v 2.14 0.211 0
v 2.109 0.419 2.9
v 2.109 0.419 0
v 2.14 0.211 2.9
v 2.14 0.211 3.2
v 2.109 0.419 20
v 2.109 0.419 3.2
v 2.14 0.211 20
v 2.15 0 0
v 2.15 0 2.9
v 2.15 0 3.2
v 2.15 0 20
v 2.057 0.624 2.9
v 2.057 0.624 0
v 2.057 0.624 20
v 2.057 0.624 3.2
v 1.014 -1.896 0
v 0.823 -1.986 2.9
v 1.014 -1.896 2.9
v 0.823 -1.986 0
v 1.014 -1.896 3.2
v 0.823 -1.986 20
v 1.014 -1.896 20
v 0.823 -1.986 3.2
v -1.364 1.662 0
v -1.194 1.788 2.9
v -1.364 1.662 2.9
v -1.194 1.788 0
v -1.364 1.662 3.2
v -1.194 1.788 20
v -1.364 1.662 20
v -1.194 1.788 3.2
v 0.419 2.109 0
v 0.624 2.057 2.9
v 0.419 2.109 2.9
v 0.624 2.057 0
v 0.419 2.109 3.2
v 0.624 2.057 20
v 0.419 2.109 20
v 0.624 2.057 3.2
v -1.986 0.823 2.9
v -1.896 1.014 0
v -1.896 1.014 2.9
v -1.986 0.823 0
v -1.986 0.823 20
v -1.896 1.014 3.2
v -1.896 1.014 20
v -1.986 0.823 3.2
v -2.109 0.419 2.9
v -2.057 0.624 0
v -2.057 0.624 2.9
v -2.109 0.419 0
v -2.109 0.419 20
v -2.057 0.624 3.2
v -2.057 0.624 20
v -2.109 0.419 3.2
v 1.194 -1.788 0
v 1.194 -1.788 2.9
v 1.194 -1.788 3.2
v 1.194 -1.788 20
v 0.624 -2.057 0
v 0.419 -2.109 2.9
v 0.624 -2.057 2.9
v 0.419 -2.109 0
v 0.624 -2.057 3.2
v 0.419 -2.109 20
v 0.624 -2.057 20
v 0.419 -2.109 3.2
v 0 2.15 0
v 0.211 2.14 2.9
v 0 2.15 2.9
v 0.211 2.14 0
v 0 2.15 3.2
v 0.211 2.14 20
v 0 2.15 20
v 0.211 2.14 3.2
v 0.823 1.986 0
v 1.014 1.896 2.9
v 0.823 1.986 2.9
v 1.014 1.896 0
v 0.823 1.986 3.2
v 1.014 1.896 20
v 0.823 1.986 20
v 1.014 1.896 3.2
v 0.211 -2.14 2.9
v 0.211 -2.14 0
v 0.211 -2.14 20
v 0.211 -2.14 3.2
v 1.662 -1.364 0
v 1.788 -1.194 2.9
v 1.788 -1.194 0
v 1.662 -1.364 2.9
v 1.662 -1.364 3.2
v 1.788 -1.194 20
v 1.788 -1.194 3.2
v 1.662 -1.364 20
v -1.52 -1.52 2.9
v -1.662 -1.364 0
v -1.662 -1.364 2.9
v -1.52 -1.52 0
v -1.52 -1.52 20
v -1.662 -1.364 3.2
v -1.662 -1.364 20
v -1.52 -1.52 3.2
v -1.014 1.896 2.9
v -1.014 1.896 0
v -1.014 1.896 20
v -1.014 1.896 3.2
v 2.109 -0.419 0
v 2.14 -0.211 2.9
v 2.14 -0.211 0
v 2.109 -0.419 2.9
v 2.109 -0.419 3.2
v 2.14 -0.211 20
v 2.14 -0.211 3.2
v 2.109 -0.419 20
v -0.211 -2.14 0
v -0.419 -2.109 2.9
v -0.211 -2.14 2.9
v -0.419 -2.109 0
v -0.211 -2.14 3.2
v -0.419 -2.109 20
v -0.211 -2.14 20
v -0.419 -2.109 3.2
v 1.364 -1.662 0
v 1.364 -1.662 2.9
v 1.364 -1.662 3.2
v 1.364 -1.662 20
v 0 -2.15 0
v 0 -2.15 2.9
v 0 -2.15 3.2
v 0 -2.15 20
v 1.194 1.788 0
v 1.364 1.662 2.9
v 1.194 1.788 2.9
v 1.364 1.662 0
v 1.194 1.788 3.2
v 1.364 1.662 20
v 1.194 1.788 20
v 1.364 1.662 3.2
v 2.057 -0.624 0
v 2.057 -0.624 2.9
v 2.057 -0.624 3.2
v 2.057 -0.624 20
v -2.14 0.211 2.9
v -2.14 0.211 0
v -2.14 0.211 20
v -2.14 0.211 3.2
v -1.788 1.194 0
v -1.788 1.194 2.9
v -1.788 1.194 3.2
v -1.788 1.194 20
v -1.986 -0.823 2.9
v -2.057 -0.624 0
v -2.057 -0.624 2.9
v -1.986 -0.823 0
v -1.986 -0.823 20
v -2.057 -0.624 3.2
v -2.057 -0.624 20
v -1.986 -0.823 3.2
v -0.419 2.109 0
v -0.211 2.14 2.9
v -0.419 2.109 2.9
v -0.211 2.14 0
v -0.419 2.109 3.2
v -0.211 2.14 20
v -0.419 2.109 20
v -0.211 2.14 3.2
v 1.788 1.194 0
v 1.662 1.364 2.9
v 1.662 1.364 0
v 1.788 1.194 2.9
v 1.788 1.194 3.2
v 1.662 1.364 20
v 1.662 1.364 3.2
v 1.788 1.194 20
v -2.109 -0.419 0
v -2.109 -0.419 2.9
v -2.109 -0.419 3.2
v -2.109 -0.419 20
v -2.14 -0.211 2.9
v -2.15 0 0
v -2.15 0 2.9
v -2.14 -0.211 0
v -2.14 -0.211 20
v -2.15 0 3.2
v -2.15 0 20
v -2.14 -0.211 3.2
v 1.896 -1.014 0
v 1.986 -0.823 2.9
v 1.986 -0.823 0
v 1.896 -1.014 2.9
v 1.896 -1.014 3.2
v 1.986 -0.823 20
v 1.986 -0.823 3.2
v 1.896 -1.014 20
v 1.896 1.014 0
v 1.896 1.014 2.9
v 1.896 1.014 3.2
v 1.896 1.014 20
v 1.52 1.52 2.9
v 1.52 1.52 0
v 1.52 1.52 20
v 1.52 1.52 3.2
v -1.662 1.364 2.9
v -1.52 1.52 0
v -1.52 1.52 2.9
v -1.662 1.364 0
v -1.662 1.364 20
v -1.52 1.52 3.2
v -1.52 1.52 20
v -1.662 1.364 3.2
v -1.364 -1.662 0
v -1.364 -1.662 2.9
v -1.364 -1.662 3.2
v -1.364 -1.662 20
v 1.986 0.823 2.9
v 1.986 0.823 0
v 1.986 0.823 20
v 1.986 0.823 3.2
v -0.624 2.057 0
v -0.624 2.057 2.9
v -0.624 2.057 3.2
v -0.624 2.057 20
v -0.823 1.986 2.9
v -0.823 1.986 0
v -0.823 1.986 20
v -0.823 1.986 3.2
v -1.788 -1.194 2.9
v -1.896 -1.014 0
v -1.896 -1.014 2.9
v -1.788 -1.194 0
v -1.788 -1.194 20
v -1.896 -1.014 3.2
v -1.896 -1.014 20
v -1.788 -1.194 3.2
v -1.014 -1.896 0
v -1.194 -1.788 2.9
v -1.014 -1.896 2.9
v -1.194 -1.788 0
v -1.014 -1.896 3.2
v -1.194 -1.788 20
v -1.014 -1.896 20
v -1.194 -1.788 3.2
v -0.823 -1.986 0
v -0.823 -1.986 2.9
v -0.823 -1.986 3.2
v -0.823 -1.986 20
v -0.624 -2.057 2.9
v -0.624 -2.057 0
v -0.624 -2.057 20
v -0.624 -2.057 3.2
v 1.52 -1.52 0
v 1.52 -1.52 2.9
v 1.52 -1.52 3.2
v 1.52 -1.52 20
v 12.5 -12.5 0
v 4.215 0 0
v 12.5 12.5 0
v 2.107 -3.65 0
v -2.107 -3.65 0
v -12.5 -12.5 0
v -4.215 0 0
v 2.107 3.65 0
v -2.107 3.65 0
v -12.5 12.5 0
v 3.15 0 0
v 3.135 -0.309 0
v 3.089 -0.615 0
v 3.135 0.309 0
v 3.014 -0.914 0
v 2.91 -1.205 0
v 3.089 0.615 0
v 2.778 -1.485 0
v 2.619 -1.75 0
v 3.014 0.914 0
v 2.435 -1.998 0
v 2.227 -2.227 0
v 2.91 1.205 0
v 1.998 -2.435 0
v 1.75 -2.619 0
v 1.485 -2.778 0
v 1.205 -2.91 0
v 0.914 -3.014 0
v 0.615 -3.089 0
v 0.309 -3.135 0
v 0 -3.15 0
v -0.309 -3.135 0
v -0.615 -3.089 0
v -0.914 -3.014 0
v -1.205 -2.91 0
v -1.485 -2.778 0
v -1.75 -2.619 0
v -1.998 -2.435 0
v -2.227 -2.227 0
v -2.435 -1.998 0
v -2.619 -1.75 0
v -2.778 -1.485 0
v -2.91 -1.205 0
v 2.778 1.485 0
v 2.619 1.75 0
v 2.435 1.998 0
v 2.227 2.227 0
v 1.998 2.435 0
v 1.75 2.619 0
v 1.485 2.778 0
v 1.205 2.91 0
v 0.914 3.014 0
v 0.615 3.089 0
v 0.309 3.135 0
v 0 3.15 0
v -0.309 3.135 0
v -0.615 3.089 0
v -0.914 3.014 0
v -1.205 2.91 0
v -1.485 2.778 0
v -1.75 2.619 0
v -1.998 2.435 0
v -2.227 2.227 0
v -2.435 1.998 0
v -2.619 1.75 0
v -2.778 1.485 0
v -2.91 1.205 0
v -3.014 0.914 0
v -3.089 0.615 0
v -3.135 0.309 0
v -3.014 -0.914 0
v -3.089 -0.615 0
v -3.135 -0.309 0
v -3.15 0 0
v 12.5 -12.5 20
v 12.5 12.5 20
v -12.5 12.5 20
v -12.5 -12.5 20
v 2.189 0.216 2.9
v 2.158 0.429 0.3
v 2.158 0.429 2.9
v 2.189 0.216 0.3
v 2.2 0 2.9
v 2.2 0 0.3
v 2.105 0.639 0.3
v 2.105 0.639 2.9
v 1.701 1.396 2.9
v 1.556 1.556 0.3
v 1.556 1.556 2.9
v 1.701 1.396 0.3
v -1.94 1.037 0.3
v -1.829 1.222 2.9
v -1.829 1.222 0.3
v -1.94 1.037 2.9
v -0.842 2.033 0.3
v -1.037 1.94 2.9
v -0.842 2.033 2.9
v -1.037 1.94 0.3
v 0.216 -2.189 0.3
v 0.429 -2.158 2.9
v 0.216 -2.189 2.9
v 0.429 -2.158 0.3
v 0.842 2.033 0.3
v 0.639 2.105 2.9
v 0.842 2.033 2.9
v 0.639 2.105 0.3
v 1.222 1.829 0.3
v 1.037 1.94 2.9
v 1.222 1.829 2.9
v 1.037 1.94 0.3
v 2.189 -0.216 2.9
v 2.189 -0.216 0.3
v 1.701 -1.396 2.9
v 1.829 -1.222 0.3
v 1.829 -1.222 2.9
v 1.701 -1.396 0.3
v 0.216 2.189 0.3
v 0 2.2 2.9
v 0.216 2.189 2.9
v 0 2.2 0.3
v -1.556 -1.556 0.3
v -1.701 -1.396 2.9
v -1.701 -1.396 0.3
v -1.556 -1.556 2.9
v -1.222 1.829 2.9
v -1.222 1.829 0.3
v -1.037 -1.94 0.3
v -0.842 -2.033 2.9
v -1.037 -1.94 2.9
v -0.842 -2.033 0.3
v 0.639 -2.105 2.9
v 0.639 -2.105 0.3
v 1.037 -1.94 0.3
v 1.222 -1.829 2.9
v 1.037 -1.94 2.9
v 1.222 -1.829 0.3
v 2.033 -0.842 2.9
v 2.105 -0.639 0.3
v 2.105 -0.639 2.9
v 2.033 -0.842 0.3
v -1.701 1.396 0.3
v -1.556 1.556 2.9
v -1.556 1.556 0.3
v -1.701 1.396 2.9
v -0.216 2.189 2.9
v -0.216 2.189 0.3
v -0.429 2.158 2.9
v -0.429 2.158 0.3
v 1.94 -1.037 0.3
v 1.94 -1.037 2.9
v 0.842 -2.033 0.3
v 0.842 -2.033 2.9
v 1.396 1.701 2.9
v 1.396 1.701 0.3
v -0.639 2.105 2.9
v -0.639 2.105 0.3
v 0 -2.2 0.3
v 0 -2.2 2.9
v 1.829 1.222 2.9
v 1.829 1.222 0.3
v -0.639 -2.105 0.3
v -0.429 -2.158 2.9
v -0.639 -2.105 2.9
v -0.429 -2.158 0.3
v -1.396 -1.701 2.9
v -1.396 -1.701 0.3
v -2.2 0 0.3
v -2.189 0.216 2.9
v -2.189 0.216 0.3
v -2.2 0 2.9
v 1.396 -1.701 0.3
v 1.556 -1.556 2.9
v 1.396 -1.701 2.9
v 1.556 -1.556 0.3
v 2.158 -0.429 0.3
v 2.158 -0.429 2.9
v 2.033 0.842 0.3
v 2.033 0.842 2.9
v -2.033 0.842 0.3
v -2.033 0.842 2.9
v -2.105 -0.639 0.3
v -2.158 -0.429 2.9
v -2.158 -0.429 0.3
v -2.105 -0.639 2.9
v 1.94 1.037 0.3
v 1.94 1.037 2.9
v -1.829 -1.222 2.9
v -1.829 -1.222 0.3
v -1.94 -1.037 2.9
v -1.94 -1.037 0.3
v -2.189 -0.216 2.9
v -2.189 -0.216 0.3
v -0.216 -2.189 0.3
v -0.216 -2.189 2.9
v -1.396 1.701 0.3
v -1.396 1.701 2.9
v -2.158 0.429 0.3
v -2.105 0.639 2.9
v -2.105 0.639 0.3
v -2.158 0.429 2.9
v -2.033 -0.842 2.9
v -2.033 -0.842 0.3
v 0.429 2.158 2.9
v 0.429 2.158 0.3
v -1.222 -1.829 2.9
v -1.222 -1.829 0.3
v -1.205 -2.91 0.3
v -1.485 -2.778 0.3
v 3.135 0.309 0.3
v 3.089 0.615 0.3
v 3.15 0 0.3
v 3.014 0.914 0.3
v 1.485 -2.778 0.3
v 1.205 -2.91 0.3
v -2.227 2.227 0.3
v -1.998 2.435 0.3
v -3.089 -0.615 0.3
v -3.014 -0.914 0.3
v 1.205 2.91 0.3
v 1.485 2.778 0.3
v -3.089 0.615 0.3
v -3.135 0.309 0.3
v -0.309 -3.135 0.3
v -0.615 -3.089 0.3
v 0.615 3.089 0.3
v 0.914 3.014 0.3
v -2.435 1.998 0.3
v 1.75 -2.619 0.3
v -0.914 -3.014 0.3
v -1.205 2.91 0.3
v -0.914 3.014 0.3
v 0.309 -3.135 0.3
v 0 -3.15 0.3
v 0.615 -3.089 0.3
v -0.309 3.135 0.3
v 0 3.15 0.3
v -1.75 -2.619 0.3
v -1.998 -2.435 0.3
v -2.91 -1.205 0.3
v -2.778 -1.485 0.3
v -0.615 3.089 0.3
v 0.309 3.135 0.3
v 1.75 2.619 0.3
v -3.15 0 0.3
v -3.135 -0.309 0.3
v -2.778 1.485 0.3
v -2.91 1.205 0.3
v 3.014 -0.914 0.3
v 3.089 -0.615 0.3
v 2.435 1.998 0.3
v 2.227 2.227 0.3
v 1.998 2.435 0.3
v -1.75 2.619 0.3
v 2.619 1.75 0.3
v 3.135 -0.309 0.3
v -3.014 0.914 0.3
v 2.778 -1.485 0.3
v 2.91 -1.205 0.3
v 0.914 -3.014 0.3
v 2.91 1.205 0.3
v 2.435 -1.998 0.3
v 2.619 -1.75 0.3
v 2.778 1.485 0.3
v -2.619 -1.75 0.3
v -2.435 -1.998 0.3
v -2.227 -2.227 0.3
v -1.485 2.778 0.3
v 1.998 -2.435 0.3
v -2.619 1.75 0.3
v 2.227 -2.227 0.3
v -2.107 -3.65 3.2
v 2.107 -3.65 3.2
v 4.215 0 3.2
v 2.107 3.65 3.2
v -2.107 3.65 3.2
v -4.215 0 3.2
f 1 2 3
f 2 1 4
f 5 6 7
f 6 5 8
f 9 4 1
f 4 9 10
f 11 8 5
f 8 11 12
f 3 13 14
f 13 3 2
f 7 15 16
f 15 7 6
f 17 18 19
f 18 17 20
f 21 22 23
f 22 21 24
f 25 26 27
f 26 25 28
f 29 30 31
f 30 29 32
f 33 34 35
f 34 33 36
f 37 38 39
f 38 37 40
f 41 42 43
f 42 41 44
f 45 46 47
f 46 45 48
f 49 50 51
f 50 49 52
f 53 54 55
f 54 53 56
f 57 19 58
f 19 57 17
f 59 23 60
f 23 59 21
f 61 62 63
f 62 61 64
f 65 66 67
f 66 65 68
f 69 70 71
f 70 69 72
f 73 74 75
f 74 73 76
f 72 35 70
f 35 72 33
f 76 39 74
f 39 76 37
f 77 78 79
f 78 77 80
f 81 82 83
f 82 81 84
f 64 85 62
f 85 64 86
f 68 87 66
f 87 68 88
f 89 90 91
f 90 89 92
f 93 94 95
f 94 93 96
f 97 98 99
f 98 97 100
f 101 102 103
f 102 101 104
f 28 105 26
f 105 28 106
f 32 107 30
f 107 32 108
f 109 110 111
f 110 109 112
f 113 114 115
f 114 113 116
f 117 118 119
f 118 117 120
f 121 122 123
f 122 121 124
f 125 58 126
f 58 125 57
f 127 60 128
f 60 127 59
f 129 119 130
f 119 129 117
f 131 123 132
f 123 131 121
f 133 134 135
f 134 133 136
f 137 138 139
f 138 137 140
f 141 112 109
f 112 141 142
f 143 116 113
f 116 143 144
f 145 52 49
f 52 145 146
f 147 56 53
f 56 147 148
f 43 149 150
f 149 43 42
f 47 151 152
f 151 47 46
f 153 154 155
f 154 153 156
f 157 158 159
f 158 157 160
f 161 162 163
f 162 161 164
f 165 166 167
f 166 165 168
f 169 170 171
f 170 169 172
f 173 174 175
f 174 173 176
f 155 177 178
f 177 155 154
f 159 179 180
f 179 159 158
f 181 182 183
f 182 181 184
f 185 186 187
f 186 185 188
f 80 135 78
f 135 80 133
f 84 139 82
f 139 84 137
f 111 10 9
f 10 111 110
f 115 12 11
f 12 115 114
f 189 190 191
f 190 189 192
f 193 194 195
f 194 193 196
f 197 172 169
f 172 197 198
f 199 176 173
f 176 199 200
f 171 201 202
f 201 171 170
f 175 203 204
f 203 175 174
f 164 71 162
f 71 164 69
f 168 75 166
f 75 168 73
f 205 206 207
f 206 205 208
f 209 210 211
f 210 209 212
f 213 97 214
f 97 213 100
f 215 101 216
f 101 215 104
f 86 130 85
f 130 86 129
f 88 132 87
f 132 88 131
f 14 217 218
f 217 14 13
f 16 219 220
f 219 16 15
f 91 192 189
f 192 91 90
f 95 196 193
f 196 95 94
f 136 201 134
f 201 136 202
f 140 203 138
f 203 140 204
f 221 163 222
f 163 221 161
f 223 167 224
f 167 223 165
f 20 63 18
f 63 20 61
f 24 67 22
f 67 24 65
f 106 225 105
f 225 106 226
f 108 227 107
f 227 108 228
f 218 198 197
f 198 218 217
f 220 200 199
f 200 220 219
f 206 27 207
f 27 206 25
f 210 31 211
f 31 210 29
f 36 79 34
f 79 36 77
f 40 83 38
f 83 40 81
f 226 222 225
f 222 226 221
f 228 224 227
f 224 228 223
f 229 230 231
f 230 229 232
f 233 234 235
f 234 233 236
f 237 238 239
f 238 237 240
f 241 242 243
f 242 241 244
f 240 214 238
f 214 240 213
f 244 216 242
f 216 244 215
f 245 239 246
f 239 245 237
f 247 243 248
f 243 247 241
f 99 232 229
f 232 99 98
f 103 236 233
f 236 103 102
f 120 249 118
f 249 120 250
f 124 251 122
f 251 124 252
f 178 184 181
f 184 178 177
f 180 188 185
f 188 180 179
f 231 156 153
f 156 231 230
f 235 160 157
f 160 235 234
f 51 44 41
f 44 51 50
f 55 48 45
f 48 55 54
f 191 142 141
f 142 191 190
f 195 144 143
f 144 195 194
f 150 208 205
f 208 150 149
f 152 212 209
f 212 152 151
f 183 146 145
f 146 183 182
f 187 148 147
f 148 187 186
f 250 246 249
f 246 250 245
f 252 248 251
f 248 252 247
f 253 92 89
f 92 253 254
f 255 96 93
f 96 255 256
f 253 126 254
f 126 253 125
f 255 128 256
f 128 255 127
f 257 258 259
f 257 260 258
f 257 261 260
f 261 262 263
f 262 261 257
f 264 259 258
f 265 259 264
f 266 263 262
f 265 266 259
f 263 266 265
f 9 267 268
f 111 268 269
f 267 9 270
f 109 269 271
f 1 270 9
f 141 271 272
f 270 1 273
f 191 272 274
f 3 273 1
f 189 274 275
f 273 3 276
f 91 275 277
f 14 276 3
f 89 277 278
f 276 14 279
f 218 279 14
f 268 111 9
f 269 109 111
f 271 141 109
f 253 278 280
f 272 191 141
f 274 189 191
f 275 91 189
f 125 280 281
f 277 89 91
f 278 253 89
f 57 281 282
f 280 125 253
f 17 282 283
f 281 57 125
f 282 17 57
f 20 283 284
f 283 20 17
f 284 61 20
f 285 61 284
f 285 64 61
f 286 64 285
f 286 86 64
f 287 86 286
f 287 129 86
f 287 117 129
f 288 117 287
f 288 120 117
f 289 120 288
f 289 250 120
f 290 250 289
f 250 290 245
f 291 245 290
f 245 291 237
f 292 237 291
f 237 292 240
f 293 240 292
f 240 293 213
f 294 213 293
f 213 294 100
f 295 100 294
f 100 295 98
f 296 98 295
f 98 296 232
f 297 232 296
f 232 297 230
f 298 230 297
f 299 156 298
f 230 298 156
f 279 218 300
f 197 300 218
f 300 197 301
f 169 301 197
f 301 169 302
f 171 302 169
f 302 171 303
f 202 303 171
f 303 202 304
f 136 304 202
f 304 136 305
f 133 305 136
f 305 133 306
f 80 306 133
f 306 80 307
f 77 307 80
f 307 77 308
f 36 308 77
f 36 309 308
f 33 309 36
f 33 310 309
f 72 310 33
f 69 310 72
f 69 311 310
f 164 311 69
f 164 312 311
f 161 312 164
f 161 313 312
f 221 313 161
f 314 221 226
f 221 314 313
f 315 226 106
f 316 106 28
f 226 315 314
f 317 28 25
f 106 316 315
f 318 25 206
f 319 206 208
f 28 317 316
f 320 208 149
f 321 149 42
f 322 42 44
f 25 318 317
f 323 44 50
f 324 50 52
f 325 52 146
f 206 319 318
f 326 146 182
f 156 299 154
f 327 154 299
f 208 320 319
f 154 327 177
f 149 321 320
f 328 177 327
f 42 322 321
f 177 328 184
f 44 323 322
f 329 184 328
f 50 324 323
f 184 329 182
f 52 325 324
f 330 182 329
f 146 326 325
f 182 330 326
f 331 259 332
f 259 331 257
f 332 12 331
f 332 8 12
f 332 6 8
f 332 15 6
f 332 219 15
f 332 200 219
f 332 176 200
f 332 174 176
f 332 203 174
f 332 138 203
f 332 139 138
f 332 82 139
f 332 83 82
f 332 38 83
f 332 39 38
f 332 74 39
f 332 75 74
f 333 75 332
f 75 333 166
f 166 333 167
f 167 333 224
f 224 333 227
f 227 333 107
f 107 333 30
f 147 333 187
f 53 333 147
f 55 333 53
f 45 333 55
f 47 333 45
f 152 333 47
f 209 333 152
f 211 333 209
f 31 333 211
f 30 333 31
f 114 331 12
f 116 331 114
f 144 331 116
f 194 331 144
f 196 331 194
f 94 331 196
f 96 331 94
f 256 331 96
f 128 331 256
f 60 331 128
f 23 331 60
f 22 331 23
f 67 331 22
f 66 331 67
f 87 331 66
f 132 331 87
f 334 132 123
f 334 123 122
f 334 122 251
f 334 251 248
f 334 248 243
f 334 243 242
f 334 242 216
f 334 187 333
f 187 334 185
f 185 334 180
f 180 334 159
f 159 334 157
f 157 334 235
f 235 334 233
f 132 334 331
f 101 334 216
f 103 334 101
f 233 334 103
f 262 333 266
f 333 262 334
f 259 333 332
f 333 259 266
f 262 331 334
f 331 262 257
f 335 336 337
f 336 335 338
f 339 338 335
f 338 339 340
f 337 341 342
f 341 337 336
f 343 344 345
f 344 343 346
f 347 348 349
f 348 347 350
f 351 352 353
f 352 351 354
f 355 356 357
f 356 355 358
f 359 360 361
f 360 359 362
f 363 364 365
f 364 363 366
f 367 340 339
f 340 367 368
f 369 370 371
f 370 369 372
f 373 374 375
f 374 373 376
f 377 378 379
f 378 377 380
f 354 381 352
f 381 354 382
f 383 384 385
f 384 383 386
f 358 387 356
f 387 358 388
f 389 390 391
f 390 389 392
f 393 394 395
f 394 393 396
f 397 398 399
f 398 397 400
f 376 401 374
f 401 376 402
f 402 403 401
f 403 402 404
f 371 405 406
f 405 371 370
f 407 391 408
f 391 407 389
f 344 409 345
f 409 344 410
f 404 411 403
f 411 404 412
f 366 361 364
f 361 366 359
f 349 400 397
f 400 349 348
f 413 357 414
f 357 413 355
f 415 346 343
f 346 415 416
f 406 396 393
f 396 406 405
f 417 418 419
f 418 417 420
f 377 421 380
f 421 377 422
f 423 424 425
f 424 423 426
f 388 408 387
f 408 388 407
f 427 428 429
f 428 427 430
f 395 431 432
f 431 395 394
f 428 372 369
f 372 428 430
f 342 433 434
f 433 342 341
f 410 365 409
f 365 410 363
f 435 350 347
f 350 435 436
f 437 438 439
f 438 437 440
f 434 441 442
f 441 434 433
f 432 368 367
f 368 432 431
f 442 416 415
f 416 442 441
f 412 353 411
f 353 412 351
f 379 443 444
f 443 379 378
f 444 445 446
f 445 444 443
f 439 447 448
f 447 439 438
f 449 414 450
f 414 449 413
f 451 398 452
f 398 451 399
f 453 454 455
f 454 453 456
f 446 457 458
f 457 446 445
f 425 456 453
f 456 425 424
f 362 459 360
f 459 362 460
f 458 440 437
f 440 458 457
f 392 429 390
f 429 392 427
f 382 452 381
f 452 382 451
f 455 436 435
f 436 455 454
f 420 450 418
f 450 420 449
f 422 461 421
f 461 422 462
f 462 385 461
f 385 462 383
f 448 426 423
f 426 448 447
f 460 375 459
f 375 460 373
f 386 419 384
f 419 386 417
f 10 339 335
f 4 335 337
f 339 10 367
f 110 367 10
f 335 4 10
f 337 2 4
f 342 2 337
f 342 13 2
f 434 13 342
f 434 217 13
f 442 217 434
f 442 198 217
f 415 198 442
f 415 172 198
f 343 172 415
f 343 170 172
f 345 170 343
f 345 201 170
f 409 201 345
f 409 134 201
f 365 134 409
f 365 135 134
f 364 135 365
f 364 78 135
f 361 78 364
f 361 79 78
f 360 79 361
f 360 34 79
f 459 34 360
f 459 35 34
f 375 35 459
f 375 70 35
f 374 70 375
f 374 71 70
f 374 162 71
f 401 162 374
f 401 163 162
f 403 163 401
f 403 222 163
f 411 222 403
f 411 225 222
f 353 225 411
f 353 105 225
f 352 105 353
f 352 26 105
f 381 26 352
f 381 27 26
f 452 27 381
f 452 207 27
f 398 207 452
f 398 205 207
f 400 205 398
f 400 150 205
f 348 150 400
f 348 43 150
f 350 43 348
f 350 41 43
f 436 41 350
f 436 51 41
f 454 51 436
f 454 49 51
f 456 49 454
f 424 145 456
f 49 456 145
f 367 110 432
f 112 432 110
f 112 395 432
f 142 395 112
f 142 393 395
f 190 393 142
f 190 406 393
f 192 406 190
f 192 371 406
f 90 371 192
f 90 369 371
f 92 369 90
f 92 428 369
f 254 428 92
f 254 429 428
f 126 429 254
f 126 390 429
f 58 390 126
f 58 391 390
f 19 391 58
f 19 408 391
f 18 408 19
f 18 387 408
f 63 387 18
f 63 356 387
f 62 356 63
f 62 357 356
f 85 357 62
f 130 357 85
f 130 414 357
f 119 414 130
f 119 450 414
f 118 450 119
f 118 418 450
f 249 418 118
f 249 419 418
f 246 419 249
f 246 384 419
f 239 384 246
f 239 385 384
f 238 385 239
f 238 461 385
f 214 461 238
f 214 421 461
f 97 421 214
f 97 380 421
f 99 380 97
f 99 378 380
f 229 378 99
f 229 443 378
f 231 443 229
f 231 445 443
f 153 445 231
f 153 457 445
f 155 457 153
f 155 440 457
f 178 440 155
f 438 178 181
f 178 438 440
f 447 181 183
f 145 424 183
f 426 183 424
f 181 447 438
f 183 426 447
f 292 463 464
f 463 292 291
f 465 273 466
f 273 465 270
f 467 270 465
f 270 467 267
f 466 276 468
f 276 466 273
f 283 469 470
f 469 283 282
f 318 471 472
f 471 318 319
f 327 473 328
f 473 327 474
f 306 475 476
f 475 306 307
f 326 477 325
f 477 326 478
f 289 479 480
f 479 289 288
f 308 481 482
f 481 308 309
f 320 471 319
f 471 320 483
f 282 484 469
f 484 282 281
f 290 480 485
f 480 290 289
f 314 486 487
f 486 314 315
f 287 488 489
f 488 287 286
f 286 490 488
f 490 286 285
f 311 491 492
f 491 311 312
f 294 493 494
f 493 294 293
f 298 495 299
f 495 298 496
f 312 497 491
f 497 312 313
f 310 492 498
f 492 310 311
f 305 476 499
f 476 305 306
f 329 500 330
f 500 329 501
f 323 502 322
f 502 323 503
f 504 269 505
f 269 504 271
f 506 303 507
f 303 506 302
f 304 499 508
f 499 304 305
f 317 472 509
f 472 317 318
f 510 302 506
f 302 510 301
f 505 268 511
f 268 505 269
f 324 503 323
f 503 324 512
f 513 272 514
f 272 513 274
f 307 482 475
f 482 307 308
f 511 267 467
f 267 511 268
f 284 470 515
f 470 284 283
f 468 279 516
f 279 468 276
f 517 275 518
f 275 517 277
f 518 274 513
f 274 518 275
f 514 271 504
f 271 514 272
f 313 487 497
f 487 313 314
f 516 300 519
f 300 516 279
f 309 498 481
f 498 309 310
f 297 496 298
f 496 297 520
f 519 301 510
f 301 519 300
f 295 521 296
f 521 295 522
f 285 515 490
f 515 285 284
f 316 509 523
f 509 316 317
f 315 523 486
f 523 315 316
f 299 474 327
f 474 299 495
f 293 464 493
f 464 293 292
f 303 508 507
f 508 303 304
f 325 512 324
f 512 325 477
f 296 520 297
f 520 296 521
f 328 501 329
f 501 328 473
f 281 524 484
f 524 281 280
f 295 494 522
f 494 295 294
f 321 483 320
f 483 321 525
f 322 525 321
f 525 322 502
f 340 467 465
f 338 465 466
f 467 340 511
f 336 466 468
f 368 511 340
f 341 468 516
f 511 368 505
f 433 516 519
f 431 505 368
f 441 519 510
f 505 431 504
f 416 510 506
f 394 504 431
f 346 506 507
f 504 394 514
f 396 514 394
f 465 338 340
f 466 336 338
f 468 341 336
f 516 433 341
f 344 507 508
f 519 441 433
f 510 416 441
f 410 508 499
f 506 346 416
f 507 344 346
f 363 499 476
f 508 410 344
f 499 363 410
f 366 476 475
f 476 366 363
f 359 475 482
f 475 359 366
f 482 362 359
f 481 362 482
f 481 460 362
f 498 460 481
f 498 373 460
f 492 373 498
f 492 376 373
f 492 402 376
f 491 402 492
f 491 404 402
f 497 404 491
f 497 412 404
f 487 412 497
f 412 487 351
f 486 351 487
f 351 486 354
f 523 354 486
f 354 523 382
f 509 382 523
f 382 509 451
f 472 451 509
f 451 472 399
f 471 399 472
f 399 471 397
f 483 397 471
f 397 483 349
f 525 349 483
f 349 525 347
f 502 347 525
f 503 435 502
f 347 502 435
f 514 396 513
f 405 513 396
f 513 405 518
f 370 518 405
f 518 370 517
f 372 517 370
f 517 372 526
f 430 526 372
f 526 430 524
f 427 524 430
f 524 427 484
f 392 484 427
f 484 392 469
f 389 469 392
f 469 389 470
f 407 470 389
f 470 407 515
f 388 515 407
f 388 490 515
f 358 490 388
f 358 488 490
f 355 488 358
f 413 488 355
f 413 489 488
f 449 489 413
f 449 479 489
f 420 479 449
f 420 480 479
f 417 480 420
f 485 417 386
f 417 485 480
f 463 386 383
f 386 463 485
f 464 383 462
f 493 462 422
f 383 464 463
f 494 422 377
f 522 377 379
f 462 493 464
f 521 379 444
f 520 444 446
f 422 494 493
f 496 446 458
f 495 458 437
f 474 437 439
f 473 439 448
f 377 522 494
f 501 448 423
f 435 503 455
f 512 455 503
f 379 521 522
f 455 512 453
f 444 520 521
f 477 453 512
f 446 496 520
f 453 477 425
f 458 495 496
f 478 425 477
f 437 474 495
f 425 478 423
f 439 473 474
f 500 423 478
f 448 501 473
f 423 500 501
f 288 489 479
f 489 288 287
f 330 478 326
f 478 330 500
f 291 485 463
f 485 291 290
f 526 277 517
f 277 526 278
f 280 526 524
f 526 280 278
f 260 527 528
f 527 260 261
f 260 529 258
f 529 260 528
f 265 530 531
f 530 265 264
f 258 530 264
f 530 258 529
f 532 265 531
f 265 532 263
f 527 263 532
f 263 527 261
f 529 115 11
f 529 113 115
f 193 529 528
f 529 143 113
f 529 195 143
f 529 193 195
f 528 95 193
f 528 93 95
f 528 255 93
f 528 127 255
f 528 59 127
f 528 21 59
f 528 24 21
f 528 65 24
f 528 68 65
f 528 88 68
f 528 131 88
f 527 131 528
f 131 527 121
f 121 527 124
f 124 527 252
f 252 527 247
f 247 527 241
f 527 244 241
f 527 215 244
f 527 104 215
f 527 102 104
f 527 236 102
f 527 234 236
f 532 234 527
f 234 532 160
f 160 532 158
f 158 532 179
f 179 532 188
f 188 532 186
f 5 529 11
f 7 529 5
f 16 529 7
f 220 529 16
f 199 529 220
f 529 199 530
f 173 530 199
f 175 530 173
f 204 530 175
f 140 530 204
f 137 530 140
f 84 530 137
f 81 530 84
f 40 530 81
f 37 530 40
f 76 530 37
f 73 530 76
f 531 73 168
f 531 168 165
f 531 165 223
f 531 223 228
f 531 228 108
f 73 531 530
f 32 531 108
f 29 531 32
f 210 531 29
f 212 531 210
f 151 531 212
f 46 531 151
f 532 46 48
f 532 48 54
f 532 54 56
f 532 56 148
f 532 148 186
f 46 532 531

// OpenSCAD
$fn=64;
color("BurlyWood"){difference(){difference(){translate(v = [-12.500, -12.500])
cube(size = [25, 25, 20]);
translate(v = [0, 0, 40])
mirror(v = [0, 0, 1])
union(){color("Gainsboro"){translate(v = [0, 0, -4])
cylinder(h = 4, r = 3.500);
}
color("Gainsboro"){cylinder(h = 20, r = 2.150);
}
color("DarkGray"){translate(v = [0, 0, 20])
cylinder(h = 20, r = 2.150);
}
}
}
color("Gainsboro"){difference(){cylinder(h = 3.200, r = 4.215, $fn = 6);
union(){cylinder(h = 2.900, r = 2.200);
cylinder(h = 0.300, r = 3.150);
}
}
}
}
}
